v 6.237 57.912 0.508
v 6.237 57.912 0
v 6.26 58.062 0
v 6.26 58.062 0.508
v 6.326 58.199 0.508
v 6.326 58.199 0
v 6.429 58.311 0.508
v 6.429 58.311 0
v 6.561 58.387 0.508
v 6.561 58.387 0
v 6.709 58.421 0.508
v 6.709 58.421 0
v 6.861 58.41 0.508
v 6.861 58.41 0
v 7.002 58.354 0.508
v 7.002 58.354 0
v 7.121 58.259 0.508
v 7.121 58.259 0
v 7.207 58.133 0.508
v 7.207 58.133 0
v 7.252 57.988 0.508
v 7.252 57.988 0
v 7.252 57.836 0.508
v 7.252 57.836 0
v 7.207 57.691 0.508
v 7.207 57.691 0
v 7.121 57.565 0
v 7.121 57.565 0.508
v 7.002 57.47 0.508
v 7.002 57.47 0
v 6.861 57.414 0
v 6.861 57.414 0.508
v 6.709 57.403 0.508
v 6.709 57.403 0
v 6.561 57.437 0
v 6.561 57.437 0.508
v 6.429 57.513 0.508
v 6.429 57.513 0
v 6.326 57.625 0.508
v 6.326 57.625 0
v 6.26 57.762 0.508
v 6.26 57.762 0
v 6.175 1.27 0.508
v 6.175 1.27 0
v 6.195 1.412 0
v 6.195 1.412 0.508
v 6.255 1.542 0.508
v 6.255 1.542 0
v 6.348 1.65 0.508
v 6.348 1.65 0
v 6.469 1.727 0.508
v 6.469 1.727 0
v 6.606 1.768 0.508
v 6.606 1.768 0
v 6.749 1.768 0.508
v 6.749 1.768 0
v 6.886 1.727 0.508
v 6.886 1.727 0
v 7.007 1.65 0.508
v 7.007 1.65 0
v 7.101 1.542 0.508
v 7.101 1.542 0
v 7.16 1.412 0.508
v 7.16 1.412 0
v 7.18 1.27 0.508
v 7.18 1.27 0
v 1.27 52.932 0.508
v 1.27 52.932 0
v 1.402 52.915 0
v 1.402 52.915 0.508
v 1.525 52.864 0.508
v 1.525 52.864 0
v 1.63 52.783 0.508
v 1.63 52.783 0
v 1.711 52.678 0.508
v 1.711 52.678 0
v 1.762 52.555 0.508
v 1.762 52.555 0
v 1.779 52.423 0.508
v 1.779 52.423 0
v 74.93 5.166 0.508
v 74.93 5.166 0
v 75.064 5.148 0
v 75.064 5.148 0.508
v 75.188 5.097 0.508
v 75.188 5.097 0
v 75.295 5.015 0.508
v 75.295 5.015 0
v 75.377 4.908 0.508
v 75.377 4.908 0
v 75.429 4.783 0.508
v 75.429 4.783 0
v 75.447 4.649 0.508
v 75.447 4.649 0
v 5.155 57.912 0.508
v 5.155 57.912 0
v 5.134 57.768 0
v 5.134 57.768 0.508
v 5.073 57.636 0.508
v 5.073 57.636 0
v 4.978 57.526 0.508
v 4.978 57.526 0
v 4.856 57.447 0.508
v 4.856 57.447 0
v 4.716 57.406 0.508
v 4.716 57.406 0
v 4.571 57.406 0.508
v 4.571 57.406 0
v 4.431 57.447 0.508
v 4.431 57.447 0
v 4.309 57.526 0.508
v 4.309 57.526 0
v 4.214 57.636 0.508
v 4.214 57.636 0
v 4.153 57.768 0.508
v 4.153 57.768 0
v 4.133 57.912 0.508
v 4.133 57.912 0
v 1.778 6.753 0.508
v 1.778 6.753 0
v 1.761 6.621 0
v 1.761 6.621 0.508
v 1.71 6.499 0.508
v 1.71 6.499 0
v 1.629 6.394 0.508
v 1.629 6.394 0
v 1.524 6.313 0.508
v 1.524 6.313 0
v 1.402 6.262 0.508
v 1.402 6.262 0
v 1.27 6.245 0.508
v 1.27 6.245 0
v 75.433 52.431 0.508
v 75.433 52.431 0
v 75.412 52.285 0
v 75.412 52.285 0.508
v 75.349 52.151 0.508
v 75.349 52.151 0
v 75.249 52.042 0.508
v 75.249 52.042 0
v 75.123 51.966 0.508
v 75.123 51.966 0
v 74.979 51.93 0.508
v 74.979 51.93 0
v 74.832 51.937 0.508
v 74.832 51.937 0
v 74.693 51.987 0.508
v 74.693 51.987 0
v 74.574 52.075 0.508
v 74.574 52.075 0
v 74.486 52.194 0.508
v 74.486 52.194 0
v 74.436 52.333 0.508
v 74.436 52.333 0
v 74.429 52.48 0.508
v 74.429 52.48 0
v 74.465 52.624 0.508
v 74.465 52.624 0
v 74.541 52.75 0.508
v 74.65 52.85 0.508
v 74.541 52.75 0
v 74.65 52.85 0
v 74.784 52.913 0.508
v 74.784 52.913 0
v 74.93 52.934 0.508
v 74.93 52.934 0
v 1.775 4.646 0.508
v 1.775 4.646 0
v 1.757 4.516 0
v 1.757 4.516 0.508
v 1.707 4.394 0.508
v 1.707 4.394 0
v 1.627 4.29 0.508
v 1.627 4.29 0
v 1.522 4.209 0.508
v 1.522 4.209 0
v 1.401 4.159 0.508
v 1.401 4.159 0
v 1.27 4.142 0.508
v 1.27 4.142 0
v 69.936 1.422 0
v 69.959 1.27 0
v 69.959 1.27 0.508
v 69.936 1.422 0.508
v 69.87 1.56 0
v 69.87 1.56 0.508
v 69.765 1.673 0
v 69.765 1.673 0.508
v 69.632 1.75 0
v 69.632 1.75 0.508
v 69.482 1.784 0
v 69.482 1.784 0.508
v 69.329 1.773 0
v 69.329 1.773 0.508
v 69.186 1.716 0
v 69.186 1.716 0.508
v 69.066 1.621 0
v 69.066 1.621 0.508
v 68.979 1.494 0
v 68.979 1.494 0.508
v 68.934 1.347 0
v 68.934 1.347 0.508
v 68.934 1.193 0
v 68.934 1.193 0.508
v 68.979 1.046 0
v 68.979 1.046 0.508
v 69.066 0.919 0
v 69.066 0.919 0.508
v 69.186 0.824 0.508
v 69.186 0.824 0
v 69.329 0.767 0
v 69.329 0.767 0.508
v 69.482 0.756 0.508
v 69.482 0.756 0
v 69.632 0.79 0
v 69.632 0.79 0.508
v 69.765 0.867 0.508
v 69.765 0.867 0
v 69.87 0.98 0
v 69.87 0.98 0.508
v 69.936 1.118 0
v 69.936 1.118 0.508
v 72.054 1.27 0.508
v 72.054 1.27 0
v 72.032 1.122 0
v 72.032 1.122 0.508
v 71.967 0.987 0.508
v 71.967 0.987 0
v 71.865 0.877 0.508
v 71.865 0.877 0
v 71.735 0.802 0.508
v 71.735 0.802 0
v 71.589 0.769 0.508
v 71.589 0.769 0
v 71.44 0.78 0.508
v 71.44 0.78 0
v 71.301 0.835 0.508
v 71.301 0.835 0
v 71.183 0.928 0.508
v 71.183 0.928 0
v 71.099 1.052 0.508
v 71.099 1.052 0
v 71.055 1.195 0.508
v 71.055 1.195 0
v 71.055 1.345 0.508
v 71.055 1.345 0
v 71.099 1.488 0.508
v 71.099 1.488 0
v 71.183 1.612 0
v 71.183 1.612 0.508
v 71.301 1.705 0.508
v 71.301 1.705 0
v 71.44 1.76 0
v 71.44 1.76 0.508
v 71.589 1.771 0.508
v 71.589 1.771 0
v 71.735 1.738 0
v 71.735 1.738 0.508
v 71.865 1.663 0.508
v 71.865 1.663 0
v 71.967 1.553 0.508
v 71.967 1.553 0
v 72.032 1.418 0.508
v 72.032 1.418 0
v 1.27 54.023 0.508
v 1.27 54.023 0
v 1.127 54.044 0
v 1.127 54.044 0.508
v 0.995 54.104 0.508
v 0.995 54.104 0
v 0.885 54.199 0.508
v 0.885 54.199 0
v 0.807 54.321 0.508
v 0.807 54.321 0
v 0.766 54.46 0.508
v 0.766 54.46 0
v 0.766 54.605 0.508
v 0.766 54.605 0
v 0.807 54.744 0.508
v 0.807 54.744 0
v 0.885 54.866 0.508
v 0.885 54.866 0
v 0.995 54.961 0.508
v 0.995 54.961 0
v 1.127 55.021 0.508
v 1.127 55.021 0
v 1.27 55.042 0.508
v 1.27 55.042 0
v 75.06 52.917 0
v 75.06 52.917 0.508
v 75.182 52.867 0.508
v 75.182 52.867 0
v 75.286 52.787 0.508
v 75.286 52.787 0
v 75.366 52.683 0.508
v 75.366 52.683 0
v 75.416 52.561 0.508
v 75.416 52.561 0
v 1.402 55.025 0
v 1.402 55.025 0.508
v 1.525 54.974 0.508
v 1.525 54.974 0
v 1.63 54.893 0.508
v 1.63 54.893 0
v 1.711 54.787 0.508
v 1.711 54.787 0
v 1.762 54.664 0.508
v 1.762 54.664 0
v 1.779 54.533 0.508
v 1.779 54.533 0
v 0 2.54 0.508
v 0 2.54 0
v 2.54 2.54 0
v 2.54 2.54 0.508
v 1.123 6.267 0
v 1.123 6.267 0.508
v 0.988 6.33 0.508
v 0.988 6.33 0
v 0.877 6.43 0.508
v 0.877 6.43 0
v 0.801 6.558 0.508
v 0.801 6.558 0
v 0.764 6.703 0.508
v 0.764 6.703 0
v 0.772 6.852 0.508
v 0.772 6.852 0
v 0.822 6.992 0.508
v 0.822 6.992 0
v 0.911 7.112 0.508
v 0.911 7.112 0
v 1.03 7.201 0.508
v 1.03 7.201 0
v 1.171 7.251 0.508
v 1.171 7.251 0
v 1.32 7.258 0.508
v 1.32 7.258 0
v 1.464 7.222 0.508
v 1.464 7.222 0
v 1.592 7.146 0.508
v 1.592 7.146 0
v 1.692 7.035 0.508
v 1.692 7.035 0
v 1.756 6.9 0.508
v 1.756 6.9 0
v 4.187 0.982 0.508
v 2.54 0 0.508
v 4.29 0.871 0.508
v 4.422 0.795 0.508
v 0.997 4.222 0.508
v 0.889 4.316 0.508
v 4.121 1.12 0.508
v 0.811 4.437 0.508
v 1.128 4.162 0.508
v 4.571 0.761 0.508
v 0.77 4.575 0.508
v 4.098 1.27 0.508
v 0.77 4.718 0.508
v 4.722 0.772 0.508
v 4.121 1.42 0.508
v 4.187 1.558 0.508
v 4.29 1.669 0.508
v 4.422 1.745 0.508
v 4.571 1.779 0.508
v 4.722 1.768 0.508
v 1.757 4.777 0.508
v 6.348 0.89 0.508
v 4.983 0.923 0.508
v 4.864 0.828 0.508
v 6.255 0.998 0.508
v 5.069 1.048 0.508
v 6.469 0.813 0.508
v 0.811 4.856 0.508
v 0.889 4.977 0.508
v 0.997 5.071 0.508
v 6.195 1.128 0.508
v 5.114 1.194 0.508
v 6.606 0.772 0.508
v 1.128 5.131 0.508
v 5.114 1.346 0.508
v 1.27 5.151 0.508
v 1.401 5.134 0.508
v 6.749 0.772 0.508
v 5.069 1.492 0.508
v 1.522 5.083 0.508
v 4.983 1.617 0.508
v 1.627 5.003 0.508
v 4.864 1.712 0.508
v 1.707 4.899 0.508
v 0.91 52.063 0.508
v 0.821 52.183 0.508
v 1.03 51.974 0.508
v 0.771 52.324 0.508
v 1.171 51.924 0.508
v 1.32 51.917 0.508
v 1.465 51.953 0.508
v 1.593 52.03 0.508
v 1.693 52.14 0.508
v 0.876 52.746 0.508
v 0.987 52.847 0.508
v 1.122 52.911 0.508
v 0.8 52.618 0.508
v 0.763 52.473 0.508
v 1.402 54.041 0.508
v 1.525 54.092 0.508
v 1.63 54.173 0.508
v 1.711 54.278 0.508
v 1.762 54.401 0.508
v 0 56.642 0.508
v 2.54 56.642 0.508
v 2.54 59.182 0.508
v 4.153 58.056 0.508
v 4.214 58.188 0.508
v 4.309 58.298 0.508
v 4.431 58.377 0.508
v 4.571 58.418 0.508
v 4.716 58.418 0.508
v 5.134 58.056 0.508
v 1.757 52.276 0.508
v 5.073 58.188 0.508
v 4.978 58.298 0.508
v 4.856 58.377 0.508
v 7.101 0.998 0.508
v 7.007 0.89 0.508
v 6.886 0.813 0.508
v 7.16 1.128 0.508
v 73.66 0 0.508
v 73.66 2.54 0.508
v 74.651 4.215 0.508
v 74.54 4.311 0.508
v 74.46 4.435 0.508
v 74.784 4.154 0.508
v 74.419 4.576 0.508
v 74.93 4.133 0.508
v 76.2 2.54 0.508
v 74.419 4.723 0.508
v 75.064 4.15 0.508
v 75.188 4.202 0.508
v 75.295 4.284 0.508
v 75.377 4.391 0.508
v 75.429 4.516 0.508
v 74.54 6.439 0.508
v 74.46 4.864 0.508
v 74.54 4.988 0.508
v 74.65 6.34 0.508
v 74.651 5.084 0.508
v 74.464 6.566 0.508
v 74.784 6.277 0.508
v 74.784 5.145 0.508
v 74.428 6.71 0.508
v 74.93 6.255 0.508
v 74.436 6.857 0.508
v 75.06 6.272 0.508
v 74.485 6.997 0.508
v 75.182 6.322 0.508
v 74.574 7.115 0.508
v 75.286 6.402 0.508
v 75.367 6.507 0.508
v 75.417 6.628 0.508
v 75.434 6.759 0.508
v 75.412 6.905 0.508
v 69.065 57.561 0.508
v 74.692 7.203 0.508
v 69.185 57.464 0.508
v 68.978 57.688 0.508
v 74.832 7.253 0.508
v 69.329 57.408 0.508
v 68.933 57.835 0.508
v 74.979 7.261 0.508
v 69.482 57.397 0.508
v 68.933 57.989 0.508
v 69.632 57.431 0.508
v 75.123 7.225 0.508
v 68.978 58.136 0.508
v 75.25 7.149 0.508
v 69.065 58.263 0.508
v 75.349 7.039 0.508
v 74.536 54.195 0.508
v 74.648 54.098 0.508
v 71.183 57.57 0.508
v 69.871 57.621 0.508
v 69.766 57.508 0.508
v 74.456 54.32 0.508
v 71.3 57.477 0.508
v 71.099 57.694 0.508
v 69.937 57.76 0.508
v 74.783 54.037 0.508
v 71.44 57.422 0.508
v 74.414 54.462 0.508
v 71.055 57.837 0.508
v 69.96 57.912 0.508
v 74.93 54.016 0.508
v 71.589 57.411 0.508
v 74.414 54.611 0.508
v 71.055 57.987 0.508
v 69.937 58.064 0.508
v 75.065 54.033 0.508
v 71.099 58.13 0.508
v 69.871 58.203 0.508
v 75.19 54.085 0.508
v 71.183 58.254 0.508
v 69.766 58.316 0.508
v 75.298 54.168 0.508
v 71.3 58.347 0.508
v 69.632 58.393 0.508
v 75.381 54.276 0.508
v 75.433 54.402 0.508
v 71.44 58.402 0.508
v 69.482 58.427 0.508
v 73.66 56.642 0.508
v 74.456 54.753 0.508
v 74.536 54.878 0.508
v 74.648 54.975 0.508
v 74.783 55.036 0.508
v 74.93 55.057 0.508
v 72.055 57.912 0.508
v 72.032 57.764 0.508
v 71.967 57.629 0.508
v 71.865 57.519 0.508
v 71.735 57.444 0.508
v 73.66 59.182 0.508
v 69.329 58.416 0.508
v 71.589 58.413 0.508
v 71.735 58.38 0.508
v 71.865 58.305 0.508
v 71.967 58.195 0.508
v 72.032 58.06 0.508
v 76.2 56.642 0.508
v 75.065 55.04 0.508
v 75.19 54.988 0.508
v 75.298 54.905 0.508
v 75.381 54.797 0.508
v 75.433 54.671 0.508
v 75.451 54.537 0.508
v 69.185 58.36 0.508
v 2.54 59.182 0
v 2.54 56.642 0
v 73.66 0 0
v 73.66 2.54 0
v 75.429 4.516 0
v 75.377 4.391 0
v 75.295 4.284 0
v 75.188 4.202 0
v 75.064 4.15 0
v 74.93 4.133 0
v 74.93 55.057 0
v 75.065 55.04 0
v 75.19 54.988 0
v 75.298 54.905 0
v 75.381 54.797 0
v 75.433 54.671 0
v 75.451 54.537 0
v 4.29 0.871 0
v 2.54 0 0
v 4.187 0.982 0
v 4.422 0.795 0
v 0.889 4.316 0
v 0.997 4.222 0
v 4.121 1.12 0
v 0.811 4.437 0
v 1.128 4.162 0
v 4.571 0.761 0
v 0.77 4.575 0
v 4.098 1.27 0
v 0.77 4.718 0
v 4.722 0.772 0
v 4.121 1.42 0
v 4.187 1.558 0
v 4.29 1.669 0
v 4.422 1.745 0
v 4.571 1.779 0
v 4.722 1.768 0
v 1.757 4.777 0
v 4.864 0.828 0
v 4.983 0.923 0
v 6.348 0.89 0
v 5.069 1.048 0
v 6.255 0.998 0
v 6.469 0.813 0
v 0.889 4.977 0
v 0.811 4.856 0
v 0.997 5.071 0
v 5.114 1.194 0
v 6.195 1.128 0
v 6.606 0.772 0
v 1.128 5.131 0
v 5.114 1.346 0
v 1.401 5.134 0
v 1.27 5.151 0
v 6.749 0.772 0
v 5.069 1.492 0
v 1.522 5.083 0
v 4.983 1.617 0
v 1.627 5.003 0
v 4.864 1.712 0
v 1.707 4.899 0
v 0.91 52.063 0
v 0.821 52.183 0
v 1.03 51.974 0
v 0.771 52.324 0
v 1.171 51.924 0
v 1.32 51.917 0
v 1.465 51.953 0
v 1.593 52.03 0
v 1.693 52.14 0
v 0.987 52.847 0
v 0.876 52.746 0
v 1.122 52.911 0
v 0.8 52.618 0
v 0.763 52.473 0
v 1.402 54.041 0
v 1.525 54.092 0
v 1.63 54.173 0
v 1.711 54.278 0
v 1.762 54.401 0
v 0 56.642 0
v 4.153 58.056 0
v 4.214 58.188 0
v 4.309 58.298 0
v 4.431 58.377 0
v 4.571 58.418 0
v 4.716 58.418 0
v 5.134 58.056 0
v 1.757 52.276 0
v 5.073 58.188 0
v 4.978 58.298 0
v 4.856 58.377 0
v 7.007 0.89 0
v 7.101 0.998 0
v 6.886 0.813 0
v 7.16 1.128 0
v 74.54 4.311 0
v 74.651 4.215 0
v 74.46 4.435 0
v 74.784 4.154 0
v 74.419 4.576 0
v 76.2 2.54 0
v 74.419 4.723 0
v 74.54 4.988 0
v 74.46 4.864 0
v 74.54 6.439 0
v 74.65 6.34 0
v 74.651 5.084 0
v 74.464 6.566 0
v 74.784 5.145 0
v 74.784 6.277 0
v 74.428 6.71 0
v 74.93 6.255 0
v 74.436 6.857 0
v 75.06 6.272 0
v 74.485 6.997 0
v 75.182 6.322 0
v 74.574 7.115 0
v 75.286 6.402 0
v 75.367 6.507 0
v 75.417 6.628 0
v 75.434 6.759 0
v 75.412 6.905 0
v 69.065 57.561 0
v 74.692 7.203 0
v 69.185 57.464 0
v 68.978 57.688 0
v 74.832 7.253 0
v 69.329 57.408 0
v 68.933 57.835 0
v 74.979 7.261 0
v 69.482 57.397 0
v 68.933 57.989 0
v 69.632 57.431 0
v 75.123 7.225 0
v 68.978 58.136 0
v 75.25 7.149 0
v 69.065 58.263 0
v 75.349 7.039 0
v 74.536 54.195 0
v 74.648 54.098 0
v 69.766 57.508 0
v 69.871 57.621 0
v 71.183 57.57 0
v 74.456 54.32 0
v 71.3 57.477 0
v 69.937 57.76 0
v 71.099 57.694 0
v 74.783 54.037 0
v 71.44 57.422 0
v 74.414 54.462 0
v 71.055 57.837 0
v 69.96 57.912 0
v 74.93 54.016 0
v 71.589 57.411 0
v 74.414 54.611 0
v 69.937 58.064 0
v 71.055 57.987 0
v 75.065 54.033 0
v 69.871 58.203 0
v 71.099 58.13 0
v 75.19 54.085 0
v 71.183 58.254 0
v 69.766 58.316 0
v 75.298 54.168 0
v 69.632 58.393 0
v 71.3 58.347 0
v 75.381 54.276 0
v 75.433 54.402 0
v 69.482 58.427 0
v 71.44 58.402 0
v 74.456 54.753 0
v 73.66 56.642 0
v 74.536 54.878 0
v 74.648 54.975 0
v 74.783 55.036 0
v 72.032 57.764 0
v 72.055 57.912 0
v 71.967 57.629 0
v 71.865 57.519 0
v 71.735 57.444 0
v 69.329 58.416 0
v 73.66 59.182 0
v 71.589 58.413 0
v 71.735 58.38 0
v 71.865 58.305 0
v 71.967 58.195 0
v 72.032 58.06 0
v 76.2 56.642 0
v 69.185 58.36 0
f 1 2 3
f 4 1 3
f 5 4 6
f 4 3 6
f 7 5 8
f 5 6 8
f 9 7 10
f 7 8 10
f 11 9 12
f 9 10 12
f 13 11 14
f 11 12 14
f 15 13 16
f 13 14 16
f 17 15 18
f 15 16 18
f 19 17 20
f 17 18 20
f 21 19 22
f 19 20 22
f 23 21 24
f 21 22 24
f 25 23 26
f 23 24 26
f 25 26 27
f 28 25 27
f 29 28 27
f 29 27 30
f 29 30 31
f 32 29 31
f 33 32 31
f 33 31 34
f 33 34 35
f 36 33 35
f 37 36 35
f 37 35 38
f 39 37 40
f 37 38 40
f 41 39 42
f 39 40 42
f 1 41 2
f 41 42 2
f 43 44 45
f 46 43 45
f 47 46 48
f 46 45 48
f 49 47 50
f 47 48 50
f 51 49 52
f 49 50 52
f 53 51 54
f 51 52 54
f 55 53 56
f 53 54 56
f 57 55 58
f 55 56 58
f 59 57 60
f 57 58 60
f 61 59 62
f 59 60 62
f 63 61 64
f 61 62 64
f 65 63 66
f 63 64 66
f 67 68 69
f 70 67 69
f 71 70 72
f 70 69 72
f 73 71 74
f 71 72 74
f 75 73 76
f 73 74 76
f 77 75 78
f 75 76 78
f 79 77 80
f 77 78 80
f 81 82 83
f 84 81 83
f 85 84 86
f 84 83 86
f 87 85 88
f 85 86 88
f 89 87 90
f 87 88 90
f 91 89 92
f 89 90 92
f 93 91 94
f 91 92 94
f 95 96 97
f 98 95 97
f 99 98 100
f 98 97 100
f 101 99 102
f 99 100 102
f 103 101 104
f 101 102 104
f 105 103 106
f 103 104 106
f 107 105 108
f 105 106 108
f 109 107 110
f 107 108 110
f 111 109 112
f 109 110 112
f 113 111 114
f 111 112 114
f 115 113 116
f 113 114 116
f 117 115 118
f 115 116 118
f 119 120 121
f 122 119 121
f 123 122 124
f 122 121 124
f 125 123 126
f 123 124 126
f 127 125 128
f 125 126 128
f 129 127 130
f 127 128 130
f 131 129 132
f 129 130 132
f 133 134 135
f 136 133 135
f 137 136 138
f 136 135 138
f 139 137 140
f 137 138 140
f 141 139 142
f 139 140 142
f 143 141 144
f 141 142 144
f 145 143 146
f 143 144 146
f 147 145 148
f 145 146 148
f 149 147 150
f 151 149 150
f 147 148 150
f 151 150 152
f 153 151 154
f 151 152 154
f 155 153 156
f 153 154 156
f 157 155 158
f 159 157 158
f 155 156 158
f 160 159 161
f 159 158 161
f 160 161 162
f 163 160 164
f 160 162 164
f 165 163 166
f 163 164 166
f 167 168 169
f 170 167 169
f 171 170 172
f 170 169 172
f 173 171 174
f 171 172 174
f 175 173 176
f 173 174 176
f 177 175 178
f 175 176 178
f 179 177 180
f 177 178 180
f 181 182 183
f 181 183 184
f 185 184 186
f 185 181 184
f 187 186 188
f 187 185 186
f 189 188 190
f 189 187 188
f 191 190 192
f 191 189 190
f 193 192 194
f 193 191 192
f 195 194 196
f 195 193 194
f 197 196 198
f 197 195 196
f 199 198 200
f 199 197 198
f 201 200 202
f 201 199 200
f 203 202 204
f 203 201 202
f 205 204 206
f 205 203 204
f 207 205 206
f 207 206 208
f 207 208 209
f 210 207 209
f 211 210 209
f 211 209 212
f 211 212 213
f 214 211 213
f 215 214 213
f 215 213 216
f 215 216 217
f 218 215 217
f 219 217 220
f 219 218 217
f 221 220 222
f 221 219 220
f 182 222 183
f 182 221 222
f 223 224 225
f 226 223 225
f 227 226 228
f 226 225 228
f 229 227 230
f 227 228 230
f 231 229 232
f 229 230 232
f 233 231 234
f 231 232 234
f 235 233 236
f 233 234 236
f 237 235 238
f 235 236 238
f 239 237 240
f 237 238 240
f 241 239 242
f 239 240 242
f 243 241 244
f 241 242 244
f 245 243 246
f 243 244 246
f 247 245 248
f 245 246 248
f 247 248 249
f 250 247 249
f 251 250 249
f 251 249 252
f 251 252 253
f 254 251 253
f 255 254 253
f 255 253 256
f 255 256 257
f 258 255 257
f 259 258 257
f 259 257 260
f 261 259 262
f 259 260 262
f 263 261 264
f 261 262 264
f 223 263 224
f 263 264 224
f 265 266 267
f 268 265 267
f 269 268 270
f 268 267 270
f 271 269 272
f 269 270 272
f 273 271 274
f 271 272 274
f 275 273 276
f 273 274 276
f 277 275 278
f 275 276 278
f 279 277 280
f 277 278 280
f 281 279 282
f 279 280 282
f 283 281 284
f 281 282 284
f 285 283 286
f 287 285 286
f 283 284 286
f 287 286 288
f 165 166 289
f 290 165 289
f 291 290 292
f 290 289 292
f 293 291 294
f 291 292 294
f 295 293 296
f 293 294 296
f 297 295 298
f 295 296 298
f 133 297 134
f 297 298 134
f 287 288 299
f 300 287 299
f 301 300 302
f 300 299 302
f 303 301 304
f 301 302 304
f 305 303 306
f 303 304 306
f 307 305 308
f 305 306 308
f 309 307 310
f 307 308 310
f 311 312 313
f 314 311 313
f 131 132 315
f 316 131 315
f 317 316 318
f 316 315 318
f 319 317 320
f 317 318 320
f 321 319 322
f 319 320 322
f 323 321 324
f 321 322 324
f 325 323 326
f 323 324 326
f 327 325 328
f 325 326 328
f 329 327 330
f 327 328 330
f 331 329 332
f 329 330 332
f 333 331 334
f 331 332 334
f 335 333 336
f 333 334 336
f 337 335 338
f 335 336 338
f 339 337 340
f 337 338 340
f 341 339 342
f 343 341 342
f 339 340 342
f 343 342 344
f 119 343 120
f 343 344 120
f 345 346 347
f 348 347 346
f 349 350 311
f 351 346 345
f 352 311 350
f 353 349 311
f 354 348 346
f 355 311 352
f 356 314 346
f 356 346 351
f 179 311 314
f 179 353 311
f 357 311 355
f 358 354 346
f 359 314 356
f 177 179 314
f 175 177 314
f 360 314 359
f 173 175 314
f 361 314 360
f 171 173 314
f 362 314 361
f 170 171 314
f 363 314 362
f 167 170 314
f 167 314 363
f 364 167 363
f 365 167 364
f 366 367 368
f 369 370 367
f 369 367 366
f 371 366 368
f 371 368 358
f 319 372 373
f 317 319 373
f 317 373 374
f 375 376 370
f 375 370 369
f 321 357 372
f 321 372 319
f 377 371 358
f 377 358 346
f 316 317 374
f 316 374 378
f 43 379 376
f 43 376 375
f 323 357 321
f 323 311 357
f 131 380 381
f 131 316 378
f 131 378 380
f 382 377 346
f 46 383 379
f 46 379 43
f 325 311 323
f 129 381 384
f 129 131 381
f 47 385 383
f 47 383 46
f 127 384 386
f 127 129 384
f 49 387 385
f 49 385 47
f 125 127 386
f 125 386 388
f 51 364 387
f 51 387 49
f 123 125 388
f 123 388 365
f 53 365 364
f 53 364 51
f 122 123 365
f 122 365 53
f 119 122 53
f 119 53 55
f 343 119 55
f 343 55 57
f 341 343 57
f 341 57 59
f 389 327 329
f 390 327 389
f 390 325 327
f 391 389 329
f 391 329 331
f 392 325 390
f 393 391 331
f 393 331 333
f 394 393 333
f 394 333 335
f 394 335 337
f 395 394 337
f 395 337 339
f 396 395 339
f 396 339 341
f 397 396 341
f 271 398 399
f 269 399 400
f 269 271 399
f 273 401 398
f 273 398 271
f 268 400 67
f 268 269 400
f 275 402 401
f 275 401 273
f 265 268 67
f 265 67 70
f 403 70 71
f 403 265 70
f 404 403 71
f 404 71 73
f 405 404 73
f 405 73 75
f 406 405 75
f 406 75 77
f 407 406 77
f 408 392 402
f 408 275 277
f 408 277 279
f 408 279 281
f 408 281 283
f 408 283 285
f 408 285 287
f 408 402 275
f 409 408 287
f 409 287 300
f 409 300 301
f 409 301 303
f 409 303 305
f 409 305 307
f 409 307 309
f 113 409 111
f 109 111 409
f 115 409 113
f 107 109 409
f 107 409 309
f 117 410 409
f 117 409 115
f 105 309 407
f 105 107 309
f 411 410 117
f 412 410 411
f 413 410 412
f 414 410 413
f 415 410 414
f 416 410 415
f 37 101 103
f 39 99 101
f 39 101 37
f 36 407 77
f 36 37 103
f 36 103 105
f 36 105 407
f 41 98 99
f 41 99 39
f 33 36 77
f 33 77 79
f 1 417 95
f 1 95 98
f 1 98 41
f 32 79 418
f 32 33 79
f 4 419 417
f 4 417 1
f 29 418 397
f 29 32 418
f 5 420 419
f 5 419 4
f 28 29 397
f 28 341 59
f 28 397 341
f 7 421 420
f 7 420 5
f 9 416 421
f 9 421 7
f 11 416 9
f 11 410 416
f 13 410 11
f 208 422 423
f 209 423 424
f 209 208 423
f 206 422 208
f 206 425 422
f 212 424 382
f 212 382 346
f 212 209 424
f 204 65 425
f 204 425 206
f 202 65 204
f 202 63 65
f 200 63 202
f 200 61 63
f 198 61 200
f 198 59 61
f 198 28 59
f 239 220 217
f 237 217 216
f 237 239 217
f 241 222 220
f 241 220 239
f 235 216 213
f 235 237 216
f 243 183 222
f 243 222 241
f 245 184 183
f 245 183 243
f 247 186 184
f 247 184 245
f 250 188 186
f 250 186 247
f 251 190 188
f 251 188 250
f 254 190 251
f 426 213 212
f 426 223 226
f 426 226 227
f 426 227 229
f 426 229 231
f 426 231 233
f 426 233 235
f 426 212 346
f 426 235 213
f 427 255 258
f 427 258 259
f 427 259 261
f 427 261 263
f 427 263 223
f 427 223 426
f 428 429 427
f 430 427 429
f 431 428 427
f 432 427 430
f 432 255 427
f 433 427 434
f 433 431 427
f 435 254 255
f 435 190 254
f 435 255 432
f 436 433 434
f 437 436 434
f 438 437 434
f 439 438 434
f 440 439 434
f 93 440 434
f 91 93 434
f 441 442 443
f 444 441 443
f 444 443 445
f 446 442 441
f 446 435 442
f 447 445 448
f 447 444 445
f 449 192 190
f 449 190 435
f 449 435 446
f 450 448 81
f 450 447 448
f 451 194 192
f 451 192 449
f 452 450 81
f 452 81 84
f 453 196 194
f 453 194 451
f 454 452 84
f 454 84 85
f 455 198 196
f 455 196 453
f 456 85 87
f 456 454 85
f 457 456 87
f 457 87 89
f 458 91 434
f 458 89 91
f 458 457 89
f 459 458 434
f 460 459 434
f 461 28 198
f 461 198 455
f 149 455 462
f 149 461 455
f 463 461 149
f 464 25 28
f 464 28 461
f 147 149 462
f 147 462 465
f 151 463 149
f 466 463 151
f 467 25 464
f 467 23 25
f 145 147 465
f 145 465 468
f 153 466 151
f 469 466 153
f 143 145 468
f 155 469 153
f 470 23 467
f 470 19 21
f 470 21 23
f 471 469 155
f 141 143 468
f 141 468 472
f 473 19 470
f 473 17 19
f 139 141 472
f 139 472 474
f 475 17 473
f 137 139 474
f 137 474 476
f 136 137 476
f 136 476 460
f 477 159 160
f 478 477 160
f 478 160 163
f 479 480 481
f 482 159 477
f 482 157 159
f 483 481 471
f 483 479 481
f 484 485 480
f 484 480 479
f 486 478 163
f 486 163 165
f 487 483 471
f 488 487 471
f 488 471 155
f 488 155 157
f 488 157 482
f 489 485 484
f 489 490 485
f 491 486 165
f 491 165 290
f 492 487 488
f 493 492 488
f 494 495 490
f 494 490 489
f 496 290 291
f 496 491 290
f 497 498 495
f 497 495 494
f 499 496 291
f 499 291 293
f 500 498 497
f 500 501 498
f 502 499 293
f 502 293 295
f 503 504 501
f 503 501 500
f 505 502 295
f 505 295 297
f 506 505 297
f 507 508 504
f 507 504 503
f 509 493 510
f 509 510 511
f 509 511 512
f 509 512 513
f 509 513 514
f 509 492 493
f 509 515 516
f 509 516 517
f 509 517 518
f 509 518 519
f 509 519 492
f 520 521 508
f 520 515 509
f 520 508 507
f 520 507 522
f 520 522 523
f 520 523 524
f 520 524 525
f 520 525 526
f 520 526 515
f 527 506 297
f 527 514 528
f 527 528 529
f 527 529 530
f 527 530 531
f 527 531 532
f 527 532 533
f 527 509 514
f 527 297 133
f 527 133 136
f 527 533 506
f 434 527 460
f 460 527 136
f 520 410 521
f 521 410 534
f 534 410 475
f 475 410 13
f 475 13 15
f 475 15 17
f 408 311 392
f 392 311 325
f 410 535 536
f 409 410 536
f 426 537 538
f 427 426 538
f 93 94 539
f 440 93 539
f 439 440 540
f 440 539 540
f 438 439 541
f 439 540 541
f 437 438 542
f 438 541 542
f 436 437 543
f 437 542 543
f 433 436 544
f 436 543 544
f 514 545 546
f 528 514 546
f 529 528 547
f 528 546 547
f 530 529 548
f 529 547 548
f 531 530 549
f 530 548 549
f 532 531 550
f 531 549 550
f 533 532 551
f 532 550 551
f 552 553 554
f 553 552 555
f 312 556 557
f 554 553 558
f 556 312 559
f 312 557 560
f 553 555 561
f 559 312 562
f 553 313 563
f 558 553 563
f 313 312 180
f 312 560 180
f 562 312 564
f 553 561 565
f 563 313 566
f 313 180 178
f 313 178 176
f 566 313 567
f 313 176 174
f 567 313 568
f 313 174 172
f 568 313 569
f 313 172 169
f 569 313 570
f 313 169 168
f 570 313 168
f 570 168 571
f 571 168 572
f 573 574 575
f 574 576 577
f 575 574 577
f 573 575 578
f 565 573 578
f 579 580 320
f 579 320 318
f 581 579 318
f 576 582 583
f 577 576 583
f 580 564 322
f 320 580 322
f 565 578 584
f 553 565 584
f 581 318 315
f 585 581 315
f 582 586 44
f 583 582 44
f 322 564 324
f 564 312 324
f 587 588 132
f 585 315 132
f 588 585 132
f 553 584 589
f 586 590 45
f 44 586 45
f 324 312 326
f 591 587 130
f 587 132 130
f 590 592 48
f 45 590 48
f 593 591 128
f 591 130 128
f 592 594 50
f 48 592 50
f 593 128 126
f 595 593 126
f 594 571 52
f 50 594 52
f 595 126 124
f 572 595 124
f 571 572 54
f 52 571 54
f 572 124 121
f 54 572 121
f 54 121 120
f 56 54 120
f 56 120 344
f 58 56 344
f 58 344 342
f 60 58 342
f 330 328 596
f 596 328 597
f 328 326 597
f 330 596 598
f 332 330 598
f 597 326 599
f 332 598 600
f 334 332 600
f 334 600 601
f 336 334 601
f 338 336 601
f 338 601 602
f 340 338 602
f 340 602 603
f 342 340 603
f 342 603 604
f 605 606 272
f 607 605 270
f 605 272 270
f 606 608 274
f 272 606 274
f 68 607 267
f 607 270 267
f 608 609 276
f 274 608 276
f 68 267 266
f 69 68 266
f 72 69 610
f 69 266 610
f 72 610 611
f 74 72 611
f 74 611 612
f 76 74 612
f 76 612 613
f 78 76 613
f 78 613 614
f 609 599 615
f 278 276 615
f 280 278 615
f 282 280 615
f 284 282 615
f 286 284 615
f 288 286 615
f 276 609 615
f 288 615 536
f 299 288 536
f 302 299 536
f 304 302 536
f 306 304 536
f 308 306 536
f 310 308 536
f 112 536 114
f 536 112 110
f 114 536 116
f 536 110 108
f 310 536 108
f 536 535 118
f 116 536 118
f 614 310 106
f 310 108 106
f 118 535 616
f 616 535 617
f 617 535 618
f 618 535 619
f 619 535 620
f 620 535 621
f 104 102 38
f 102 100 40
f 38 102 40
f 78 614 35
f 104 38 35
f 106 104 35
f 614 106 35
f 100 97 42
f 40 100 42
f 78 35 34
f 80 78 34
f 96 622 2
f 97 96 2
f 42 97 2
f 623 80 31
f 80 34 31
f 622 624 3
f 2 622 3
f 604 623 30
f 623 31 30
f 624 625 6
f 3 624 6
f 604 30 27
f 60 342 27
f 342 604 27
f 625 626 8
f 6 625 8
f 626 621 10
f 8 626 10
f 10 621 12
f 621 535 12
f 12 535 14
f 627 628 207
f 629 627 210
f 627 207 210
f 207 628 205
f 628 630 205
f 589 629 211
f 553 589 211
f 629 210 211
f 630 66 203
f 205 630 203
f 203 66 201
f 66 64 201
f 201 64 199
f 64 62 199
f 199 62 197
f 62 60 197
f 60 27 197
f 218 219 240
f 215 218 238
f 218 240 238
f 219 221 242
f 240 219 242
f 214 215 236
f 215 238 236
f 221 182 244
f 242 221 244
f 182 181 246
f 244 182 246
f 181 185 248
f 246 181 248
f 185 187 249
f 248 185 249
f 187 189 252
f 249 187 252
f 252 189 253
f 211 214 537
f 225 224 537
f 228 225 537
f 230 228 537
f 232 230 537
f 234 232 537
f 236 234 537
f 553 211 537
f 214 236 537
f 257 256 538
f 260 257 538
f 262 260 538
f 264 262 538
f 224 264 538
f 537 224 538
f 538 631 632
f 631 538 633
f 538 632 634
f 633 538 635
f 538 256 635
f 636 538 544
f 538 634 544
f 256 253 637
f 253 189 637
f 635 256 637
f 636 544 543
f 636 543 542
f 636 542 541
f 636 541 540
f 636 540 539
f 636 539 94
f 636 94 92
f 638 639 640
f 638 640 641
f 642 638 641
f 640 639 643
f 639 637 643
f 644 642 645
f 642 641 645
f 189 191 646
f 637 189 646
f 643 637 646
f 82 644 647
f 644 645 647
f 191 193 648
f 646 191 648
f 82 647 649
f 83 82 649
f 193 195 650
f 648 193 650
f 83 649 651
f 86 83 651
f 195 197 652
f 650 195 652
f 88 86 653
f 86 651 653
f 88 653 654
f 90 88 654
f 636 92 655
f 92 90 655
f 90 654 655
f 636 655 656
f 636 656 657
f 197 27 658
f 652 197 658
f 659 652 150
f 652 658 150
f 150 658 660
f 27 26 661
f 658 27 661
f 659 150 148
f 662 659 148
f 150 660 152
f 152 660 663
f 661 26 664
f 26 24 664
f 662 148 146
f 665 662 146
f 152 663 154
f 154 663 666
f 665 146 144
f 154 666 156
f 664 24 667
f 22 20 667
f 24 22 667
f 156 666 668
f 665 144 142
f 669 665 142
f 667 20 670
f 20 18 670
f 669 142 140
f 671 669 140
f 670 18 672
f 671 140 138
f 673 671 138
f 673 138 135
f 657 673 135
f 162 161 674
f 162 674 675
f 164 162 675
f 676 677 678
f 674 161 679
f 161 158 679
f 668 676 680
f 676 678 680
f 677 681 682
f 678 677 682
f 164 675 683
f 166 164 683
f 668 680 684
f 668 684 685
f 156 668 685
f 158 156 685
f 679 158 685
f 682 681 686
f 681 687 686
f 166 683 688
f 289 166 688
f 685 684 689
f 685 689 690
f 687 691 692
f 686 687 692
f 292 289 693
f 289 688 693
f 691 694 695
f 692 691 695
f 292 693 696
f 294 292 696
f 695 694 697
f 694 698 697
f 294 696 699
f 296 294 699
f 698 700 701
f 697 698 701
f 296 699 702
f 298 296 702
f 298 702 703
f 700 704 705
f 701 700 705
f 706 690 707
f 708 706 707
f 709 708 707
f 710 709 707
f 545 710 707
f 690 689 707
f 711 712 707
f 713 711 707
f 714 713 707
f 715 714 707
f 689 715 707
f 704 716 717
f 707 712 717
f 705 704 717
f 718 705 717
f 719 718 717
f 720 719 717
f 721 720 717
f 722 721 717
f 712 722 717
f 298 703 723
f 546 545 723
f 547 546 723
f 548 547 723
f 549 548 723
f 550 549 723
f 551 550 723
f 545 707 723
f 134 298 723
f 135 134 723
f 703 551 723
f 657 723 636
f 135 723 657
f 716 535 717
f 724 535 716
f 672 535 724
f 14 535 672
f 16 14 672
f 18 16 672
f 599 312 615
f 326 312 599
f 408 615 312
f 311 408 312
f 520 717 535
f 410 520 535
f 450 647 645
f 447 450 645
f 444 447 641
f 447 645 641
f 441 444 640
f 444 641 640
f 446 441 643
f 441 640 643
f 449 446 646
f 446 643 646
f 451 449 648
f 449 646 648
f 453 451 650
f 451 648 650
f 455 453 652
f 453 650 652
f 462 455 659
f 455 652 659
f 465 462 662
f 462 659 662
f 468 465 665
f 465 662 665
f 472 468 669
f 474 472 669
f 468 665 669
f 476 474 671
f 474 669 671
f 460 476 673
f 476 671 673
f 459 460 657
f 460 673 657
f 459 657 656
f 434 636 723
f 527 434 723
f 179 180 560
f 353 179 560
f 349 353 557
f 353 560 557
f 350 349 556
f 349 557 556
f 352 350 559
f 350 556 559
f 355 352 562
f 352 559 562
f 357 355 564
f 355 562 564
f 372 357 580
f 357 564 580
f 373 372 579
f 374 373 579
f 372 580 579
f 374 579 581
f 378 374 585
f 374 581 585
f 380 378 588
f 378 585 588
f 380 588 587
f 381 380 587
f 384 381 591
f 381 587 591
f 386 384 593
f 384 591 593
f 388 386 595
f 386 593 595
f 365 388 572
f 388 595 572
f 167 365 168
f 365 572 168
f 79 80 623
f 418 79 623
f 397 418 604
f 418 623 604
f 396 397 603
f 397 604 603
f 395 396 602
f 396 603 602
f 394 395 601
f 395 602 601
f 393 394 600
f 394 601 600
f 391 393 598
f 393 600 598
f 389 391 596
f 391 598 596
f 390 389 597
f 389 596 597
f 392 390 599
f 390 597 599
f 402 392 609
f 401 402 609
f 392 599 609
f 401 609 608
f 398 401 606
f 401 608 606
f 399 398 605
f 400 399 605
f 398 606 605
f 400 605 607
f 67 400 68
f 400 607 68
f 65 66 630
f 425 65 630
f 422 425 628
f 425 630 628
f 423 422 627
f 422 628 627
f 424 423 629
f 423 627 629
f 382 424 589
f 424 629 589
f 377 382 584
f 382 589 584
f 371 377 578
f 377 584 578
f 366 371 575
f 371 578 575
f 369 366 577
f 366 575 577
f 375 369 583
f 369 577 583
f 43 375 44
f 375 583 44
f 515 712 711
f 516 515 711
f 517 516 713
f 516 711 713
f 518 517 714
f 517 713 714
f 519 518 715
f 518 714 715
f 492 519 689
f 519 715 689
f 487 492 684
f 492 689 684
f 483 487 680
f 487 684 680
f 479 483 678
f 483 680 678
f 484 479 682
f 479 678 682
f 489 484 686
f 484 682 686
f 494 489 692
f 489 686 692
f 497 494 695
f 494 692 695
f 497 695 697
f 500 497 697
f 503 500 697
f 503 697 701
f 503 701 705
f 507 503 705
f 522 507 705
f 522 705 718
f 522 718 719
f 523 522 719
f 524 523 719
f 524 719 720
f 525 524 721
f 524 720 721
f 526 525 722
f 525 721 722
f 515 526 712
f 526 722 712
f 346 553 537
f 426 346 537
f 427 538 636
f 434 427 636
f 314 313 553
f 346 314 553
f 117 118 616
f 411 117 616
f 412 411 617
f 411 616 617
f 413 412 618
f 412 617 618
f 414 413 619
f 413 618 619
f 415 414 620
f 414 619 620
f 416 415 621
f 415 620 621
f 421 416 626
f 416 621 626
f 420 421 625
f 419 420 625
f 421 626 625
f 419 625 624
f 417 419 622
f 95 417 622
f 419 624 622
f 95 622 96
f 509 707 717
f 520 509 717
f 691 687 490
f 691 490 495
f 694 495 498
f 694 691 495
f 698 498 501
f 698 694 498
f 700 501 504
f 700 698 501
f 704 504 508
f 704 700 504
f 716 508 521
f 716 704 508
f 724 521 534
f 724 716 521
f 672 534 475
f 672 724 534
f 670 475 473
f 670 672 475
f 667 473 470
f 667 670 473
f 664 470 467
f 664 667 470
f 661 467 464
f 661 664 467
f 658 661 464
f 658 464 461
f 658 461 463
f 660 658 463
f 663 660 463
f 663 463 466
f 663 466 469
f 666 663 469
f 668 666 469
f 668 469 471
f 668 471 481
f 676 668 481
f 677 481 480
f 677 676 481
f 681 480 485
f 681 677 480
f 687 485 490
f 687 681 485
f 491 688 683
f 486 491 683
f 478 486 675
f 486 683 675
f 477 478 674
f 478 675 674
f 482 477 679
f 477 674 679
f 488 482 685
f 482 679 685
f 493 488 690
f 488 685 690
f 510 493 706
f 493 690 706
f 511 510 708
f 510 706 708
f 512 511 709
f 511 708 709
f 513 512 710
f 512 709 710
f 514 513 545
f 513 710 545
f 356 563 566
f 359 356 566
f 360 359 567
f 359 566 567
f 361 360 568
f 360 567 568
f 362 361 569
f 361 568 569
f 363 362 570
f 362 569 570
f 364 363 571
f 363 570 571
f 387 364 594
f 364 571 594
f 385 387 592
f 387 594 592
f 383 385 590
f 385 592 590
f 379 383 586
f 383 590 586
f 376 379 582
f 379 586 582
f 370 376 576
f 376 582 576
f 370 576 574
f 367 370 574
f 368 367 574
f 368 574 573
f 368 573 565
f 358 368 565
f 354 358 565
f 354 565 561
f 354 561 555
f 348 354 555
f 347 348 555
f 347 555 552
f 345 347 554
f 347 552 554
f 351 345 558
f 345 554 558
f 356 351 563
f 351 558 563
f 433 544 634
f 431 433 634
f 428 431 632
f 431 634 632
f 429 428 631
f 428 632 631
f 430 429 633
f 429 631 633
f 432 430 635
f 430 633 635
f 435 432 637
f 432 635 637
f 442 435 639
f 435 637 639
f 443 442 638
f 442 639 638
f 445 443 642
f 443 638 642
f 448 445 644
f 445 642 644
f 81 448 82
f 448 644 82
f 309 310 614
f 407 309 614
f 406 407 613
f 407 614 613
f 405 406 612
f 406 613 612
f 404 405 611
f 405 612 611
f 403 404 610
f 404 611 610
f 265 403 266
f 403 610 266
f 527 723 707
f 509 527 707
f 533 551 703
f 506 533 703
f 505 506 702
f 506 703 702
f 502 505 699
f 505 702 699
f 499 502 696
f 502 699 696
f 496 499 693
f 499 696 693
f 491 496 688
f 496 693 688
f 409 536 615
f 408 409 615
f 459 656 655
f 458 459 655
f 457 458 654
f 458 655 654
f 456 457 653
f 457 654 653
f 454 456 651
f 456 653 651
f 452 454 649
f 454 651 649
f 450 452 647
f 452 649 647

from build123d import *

# Parameters (mm, degrees)
F0_R     = 0.515571
F0_R_2   = 0.516732
F1_DEPTH = 0.508


with BuildPart() as f1:
    # F0 (on Top) → F1 (new body)
    with BuildSketch(Plane.XY):
        Polygon((2.54, 1.27), (2.54, 0), (73.66, 0), (73.66, 1.27), (73.66, 2.54), (74.93, 2.54), (76.2, 2.54), (76.2, 56.642), (74.93, 56.642), (73.66, 56.642), (73.66, 57.912), (73.66, 59.182), (2.54, 59.182), (2.54, 57.912), (2.54, 56.642), (1.27, 56.642), (0, 56.642), (0, 2.54), (1.27, 2.54), (2.54, 2.54), align=None)
        with BuildLine():
            ThreePointArc((5.119342, 1.27), (4.60881, 0.759468), (4.098278, 1.27))
            ThreePointArc((4.098278, 1.27), (4.60881, 1.780532), (5.119342, 1.27))
        make_face(mode=Mode.SUBTRACT)
        with BuildLine():
            ThreePointArc((7.180349, 1.27), (6.67762, 0.767271), (6.17489, 1.27))
            ThreePointArc((6.17489, 1.27), (6.67762, 1.772729), (7.180349, 1.27))
        make_face(mode=Mode.SUBTRACT)
        with BuildLine():
            ThreePointArc((1.774696, 4.646398), (1.626874, 4.289524), (1.27, 4.141702))
            ThreePointArc((1.27, 4.141702), (0.765304, 4.646398), (1.27, 5.151094))
            ThreePointArc((1.27, 5.151094), (1.626874, 5.003272), (1.774696, 4.646398))
        make_face(mode=Mode.SUBTRACT)
        with BuildLine():
            ThreePointArc((1.778091, 6.752796), (1.629275, 6.393521), (1.27, 6.244705))
            ThreePointArc((1.27, 6.244705), (0.910725, 7.112071), (1.778091, 6.752796))
        make_face(mode=Mode.SUBTRACT)
        with Locations((69.4436, 1.27)):
            Circle(F0_R, mode=Mode.SUBTRACT)
        with BuildLine():
            ThreePointArc((71.049353, 1.27), (71.5518, 1.772447), (72.054247, 1.27))
            ThreePointArc((72.054247, 1.27), (71.5518, 0.767553), (71.049353, 1.27))
        make_face(mode=Mode.SUBTRACT)
        with BuildLine():
            ThreePointArc((75.446638, 4.649455), (75.295318, 4.284136), (74.93, 4.132817))
            ThreePointArc((74.93, 4.132817), (74.413362, 4.649455), (74.93, 5.166093))
            ThreePointArc((74.93, 5.166093), (75.295318, 5.014773), (75.446638, 4.649455))
        make_face(mode=Mode.SUBTRACT)
        with BuildLine():
            ThreePointArc((75.434085, 6.758909), (75.286442, 6.402467), (74.93, 6.254824))
            ThreePointArc((74.93, 6.254824), (74.573558, 7.115351), (75.434085, 6.758909))
        make_face(mode=Mode.SUBTRACT)
        with BuildLine():
            ThreePointArc((1.779113, 52.423321), (0.910003, 52.063324), (1.27, 52.932433))
            ThreePointArc((1.27, 52.932433), (1.629997, 52.783318), (1.779113, 52.423321))
        make_face(mode=Mode.SUBTRACT)
        with BuildLine():
            ThreePointArc((1.27, 54.023341), (0.76068, 54.53266), (1.27, 55.04198))
            ThreePointArc((1.27, 55.04198), (1.630143, 54.892804), (1.77932, 54.53266))
            ThreePointArc((1.77932, 54.53266), (1.630143, 54.172517), (1.27, 54.023341))
        make_face(mode=Mode.SUBTRACT)
        with BuildLine():
            ThreePointArc((5.154588, 57.912), (4.643598, 57.401009), (4.132607, 57.912))
            ThreePointArc((4.132607, 57.912), (4.643598, 58.422991), (5.154588, 57.912))
        make_face(mode=Mode.SUBTRACT)
        with BuildLine():
            ThreePointArc((7.257511, 57.912), (6.747195, 57.401684), (6.236879, 57.912))
            ThreePointArc((6.236879, 57.912), (6.747195, 58.422316), (7.257511, 57.912))
        make_face(mode=Mode.SUBTRACT)
        with BuildLine():
            ThreePointArc((75.433384, 52.431013), (74.574054, 52.075067), (74.93, 52.934398))
            ThreePointArc((74.93, 52.934398), (75.285946, 52.78696), (75.433384, 52.431013))
        make_face(mode=Mode.SUBTRACT)
        with BuildLine():
            ThreePointArc((74.93, 54.015517), (74.409011, 54.536507), (74.93, 55.057496))
            ThreePointArc((74.93, 55.057496), (75.298395, 54.904902), (75.450989, 54.536507))
            ThreePointArc((75.450989, 54.536507), (75.298395, 54.168112), (74.93, 54.015517))
        make_face(mode=Mode.SUBTRACT)
        with Locations((69.4436, 57.912)):
            Circle(F0_R_2, mode=Mode.SUBTRACT)
        with BuildLine():
            ThreePointArc((71.049026, 57.912), (71.5518, 58.414774), (72.054574, 57.912))
            ThreePointArc((72.054574, 57.912), (71.5518, 57.409226), (71.049026, 57.912))
        make_face(mode=Mode.SUBTRACT)
    extrude(amount=F1_DEPTH)


solid = f1.part
